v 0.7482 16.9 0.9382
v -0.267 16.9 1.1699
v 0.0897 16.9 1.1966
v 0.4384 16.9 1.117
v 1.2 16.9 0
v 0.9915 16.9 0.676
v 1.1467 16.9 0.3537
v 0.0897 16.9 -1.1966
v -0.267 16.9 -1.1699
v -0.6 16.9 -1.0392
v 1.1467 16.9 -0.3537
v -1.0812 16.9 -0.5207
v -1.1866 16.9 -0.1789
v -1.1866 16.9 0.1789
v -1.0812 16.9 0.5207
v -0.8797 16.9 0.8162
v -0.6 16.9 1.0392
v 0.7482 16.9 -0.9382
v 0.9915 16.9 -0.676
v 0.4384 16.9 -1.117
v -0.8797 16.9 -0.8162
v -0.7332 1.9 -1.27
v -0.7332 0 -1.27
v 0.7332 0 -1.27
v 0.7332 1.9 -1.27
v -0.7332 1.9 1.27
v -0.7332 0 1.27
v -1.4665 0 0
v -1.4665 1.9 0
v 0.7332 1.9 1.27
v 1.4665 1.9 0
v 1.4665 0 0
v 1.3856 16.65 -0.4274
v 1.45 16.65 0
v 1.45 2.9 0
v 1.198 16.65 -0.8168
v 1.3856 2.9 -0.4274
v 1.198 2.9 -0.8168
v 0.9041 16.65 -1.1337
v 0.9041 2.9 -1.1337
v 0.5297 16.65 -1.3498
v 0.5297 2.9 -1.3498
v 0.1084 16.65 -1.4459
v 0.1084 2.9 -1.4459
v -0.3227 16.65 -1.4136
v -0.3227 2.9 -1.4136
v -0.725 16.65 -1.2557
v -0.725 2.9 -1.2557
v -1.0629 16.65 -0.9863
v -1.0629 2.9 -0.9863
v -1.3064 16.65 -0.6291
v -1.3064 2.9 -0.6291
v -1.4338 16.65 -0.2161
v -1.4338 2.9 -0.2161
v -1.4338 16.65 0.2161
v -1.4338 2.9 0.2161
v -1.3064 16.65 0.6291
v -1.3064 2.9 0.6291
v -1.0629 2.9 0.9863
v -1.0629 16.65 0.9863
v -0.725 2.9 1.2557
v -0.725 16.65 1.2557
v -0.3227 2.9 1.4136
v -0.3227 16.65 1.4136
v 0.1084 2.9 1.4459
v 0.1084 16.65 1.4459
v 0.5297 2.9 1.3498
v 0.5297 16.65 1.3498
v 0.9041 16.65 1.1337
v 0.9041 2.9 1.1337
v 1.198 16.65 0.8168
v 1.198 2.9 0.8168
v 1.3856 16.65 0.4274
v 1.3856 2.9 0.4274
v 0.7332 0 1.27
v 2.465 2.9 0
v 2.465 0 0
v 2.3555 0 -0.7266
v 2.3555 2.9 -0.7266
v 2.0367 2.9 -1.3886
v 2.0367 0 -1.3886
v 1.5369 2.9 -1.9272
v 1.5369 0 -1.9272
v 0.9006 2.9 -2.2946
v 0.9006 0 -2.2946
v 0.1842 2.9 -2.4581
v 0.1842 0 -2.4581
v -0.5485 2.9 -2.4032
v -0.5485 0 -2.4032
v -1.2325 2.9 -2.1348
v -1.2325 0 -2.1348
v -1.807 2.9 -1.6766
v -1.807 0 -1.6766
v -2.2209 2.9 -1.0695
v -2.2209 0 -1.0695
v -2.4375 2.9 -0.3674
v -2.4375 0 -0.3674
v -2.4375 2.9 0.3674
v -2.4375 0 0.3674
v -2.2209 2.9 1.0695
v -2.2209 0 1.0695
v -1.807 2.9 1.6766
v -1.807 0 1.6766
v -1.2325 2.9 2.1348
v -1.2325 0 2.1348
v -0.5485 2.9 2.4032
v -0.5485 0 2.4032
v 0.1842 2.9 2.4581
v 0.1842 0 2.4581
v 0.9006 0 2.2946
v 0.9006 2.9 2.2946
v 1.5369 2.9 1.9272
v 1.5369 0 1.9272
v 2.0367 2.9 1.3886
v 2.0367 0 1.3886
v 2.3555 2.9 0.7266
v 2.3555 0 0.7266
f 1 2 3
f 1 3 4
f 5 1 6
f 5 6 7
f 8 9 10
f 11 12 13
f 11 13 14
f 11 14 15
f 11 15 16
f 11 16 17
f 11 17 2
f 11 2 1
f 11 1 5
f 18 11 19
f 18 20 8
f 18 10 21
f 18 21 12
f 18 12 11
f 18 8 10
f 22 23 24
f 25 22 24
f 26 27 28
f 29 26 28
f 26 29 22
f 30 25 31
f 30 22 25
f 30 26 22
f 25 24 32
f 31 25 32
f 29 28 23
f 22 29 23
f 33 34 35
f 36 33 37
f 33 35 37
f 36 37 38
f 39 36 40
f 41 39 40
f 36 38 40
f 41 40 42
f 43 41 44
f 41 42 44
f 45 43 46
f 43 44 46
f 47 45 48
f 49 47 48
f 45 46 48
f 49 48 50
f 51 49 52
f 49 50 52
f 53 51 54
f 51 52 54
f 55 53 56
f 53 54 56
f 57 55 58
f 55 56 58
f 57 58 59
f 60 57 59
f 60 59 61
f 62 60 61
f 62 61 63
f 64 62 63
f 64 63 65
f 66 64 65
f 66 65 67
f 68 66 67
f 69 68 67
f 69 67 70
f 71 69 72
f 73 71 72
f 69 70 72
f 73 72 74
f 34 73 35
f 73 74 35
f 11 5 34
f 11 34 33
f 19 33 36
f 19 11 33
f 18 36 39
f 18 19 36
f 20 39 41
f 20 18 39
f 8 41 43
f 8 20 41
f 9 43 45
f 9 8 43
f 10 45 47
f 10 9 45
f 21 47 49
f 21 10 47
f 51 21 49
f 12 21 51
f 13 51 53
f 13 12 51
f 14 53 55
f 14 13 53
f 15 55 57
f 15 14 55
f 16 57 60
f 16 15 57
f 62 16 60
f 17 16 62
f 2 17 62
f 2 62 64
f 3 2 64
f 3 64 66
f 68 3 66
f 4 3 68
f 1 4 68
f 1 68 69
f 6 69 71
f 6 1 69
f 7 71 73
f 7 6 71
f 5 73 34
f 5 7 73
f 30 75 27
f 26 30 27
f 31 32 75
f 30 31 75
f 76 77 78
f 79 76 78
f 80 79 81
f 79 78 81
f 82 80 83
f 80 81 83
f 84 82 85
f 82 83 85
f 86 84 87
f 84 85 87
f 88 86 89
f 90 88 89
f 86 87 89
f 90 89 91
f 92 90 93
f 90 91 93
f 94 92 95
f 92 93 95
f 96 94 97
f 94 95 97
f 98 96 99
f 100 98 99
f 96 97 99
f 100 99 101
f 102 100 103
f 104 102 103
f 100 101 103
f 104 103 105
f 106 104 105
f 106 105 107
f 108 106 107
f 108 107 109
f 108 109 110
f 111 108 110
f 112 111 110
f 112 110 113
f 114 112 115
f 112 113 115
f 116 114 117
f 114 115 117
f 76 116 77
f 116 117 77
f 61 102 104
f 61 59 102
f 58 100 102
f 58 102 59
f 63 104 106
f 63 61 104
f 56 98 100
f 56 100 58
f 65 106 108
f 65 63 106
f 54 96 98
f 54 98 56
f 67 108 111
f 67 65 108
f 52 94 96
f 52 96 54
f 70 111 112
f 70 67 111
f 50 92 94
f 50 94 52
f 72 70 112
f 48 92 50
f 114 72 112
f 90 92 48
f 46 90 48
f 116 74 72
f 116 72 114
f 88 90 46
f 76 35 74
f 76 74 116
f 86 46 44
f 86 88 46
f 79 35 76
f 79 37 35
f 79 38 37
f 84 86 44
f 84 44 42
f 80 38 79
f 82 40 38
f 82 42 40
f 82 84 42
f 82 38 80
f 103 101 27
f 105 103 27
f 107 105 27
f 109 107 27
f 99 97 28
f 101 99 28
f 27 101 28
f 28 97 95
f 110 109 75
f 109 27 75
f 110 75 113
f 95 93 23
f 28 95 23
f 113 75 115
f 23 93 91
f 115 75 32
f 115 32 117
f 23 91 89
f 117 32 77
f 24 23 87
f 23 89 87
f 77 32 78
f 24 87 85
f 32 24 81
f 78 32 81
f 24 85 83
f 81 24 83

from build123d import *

# Parameters (mm, degrees)
SKETCH1_R           = 2.465
BOSS_EXTRUDE1_DEPTH = 2.9
SKETCH2_R           = 1.45
BOSS_EXTRUDE2_DEPTH = 14
CUT_EXTRUDE1_DEPTH  = 1.9
CHAMFER1_SIZE       = 0.25


with BuildPart() as part:
    # Sketch1 → Boss-Extrude1 (new body)
    with BuildSketch(Plane(origin=(0, 0, 0), x_dir=(1, 0, 0), z_dir=(0, 1, 0))):
        Circle(SKETCH1_R)
    extrude(amount=BOSS_EXTRUDE1_DEPTH)

    # Sketch2 → Boss-Extrude2 (add)
    with BuildSketch(Plane(origin=(0, 2.9, 0), x_dir=(1, 0, 0), z_dir=(0, 1, 0))):
        Circle(SKETCH2_R)
    extrude(amount=BOSS_EXTRUDE2_DEPTH)

    # Sketch3 → Cut-Extrude1 (cut)
    with BuildSketch(Plane.XZ):
        Polygon((0.733234842, -1.27), (1.466469684, 0), (0.733234842, 1.27), (-0.733234842, 1.27), (-1.466469684, 0), (-0.733234842, -1.27), align=None)
    extrude(amount=-CUT_EXTRUDE1_DEPTH, mode=Mode.SUBTRACT)

    # Chamfer1
    chamfer1_edges = [part.edges().sort_by_distance(p)[0] for p in [
        (-1.45, 16.9, 0),
    ]]
    chamfer(chamfer1_edges, length=CHAMFER1_SIZE)


solid = part.part
